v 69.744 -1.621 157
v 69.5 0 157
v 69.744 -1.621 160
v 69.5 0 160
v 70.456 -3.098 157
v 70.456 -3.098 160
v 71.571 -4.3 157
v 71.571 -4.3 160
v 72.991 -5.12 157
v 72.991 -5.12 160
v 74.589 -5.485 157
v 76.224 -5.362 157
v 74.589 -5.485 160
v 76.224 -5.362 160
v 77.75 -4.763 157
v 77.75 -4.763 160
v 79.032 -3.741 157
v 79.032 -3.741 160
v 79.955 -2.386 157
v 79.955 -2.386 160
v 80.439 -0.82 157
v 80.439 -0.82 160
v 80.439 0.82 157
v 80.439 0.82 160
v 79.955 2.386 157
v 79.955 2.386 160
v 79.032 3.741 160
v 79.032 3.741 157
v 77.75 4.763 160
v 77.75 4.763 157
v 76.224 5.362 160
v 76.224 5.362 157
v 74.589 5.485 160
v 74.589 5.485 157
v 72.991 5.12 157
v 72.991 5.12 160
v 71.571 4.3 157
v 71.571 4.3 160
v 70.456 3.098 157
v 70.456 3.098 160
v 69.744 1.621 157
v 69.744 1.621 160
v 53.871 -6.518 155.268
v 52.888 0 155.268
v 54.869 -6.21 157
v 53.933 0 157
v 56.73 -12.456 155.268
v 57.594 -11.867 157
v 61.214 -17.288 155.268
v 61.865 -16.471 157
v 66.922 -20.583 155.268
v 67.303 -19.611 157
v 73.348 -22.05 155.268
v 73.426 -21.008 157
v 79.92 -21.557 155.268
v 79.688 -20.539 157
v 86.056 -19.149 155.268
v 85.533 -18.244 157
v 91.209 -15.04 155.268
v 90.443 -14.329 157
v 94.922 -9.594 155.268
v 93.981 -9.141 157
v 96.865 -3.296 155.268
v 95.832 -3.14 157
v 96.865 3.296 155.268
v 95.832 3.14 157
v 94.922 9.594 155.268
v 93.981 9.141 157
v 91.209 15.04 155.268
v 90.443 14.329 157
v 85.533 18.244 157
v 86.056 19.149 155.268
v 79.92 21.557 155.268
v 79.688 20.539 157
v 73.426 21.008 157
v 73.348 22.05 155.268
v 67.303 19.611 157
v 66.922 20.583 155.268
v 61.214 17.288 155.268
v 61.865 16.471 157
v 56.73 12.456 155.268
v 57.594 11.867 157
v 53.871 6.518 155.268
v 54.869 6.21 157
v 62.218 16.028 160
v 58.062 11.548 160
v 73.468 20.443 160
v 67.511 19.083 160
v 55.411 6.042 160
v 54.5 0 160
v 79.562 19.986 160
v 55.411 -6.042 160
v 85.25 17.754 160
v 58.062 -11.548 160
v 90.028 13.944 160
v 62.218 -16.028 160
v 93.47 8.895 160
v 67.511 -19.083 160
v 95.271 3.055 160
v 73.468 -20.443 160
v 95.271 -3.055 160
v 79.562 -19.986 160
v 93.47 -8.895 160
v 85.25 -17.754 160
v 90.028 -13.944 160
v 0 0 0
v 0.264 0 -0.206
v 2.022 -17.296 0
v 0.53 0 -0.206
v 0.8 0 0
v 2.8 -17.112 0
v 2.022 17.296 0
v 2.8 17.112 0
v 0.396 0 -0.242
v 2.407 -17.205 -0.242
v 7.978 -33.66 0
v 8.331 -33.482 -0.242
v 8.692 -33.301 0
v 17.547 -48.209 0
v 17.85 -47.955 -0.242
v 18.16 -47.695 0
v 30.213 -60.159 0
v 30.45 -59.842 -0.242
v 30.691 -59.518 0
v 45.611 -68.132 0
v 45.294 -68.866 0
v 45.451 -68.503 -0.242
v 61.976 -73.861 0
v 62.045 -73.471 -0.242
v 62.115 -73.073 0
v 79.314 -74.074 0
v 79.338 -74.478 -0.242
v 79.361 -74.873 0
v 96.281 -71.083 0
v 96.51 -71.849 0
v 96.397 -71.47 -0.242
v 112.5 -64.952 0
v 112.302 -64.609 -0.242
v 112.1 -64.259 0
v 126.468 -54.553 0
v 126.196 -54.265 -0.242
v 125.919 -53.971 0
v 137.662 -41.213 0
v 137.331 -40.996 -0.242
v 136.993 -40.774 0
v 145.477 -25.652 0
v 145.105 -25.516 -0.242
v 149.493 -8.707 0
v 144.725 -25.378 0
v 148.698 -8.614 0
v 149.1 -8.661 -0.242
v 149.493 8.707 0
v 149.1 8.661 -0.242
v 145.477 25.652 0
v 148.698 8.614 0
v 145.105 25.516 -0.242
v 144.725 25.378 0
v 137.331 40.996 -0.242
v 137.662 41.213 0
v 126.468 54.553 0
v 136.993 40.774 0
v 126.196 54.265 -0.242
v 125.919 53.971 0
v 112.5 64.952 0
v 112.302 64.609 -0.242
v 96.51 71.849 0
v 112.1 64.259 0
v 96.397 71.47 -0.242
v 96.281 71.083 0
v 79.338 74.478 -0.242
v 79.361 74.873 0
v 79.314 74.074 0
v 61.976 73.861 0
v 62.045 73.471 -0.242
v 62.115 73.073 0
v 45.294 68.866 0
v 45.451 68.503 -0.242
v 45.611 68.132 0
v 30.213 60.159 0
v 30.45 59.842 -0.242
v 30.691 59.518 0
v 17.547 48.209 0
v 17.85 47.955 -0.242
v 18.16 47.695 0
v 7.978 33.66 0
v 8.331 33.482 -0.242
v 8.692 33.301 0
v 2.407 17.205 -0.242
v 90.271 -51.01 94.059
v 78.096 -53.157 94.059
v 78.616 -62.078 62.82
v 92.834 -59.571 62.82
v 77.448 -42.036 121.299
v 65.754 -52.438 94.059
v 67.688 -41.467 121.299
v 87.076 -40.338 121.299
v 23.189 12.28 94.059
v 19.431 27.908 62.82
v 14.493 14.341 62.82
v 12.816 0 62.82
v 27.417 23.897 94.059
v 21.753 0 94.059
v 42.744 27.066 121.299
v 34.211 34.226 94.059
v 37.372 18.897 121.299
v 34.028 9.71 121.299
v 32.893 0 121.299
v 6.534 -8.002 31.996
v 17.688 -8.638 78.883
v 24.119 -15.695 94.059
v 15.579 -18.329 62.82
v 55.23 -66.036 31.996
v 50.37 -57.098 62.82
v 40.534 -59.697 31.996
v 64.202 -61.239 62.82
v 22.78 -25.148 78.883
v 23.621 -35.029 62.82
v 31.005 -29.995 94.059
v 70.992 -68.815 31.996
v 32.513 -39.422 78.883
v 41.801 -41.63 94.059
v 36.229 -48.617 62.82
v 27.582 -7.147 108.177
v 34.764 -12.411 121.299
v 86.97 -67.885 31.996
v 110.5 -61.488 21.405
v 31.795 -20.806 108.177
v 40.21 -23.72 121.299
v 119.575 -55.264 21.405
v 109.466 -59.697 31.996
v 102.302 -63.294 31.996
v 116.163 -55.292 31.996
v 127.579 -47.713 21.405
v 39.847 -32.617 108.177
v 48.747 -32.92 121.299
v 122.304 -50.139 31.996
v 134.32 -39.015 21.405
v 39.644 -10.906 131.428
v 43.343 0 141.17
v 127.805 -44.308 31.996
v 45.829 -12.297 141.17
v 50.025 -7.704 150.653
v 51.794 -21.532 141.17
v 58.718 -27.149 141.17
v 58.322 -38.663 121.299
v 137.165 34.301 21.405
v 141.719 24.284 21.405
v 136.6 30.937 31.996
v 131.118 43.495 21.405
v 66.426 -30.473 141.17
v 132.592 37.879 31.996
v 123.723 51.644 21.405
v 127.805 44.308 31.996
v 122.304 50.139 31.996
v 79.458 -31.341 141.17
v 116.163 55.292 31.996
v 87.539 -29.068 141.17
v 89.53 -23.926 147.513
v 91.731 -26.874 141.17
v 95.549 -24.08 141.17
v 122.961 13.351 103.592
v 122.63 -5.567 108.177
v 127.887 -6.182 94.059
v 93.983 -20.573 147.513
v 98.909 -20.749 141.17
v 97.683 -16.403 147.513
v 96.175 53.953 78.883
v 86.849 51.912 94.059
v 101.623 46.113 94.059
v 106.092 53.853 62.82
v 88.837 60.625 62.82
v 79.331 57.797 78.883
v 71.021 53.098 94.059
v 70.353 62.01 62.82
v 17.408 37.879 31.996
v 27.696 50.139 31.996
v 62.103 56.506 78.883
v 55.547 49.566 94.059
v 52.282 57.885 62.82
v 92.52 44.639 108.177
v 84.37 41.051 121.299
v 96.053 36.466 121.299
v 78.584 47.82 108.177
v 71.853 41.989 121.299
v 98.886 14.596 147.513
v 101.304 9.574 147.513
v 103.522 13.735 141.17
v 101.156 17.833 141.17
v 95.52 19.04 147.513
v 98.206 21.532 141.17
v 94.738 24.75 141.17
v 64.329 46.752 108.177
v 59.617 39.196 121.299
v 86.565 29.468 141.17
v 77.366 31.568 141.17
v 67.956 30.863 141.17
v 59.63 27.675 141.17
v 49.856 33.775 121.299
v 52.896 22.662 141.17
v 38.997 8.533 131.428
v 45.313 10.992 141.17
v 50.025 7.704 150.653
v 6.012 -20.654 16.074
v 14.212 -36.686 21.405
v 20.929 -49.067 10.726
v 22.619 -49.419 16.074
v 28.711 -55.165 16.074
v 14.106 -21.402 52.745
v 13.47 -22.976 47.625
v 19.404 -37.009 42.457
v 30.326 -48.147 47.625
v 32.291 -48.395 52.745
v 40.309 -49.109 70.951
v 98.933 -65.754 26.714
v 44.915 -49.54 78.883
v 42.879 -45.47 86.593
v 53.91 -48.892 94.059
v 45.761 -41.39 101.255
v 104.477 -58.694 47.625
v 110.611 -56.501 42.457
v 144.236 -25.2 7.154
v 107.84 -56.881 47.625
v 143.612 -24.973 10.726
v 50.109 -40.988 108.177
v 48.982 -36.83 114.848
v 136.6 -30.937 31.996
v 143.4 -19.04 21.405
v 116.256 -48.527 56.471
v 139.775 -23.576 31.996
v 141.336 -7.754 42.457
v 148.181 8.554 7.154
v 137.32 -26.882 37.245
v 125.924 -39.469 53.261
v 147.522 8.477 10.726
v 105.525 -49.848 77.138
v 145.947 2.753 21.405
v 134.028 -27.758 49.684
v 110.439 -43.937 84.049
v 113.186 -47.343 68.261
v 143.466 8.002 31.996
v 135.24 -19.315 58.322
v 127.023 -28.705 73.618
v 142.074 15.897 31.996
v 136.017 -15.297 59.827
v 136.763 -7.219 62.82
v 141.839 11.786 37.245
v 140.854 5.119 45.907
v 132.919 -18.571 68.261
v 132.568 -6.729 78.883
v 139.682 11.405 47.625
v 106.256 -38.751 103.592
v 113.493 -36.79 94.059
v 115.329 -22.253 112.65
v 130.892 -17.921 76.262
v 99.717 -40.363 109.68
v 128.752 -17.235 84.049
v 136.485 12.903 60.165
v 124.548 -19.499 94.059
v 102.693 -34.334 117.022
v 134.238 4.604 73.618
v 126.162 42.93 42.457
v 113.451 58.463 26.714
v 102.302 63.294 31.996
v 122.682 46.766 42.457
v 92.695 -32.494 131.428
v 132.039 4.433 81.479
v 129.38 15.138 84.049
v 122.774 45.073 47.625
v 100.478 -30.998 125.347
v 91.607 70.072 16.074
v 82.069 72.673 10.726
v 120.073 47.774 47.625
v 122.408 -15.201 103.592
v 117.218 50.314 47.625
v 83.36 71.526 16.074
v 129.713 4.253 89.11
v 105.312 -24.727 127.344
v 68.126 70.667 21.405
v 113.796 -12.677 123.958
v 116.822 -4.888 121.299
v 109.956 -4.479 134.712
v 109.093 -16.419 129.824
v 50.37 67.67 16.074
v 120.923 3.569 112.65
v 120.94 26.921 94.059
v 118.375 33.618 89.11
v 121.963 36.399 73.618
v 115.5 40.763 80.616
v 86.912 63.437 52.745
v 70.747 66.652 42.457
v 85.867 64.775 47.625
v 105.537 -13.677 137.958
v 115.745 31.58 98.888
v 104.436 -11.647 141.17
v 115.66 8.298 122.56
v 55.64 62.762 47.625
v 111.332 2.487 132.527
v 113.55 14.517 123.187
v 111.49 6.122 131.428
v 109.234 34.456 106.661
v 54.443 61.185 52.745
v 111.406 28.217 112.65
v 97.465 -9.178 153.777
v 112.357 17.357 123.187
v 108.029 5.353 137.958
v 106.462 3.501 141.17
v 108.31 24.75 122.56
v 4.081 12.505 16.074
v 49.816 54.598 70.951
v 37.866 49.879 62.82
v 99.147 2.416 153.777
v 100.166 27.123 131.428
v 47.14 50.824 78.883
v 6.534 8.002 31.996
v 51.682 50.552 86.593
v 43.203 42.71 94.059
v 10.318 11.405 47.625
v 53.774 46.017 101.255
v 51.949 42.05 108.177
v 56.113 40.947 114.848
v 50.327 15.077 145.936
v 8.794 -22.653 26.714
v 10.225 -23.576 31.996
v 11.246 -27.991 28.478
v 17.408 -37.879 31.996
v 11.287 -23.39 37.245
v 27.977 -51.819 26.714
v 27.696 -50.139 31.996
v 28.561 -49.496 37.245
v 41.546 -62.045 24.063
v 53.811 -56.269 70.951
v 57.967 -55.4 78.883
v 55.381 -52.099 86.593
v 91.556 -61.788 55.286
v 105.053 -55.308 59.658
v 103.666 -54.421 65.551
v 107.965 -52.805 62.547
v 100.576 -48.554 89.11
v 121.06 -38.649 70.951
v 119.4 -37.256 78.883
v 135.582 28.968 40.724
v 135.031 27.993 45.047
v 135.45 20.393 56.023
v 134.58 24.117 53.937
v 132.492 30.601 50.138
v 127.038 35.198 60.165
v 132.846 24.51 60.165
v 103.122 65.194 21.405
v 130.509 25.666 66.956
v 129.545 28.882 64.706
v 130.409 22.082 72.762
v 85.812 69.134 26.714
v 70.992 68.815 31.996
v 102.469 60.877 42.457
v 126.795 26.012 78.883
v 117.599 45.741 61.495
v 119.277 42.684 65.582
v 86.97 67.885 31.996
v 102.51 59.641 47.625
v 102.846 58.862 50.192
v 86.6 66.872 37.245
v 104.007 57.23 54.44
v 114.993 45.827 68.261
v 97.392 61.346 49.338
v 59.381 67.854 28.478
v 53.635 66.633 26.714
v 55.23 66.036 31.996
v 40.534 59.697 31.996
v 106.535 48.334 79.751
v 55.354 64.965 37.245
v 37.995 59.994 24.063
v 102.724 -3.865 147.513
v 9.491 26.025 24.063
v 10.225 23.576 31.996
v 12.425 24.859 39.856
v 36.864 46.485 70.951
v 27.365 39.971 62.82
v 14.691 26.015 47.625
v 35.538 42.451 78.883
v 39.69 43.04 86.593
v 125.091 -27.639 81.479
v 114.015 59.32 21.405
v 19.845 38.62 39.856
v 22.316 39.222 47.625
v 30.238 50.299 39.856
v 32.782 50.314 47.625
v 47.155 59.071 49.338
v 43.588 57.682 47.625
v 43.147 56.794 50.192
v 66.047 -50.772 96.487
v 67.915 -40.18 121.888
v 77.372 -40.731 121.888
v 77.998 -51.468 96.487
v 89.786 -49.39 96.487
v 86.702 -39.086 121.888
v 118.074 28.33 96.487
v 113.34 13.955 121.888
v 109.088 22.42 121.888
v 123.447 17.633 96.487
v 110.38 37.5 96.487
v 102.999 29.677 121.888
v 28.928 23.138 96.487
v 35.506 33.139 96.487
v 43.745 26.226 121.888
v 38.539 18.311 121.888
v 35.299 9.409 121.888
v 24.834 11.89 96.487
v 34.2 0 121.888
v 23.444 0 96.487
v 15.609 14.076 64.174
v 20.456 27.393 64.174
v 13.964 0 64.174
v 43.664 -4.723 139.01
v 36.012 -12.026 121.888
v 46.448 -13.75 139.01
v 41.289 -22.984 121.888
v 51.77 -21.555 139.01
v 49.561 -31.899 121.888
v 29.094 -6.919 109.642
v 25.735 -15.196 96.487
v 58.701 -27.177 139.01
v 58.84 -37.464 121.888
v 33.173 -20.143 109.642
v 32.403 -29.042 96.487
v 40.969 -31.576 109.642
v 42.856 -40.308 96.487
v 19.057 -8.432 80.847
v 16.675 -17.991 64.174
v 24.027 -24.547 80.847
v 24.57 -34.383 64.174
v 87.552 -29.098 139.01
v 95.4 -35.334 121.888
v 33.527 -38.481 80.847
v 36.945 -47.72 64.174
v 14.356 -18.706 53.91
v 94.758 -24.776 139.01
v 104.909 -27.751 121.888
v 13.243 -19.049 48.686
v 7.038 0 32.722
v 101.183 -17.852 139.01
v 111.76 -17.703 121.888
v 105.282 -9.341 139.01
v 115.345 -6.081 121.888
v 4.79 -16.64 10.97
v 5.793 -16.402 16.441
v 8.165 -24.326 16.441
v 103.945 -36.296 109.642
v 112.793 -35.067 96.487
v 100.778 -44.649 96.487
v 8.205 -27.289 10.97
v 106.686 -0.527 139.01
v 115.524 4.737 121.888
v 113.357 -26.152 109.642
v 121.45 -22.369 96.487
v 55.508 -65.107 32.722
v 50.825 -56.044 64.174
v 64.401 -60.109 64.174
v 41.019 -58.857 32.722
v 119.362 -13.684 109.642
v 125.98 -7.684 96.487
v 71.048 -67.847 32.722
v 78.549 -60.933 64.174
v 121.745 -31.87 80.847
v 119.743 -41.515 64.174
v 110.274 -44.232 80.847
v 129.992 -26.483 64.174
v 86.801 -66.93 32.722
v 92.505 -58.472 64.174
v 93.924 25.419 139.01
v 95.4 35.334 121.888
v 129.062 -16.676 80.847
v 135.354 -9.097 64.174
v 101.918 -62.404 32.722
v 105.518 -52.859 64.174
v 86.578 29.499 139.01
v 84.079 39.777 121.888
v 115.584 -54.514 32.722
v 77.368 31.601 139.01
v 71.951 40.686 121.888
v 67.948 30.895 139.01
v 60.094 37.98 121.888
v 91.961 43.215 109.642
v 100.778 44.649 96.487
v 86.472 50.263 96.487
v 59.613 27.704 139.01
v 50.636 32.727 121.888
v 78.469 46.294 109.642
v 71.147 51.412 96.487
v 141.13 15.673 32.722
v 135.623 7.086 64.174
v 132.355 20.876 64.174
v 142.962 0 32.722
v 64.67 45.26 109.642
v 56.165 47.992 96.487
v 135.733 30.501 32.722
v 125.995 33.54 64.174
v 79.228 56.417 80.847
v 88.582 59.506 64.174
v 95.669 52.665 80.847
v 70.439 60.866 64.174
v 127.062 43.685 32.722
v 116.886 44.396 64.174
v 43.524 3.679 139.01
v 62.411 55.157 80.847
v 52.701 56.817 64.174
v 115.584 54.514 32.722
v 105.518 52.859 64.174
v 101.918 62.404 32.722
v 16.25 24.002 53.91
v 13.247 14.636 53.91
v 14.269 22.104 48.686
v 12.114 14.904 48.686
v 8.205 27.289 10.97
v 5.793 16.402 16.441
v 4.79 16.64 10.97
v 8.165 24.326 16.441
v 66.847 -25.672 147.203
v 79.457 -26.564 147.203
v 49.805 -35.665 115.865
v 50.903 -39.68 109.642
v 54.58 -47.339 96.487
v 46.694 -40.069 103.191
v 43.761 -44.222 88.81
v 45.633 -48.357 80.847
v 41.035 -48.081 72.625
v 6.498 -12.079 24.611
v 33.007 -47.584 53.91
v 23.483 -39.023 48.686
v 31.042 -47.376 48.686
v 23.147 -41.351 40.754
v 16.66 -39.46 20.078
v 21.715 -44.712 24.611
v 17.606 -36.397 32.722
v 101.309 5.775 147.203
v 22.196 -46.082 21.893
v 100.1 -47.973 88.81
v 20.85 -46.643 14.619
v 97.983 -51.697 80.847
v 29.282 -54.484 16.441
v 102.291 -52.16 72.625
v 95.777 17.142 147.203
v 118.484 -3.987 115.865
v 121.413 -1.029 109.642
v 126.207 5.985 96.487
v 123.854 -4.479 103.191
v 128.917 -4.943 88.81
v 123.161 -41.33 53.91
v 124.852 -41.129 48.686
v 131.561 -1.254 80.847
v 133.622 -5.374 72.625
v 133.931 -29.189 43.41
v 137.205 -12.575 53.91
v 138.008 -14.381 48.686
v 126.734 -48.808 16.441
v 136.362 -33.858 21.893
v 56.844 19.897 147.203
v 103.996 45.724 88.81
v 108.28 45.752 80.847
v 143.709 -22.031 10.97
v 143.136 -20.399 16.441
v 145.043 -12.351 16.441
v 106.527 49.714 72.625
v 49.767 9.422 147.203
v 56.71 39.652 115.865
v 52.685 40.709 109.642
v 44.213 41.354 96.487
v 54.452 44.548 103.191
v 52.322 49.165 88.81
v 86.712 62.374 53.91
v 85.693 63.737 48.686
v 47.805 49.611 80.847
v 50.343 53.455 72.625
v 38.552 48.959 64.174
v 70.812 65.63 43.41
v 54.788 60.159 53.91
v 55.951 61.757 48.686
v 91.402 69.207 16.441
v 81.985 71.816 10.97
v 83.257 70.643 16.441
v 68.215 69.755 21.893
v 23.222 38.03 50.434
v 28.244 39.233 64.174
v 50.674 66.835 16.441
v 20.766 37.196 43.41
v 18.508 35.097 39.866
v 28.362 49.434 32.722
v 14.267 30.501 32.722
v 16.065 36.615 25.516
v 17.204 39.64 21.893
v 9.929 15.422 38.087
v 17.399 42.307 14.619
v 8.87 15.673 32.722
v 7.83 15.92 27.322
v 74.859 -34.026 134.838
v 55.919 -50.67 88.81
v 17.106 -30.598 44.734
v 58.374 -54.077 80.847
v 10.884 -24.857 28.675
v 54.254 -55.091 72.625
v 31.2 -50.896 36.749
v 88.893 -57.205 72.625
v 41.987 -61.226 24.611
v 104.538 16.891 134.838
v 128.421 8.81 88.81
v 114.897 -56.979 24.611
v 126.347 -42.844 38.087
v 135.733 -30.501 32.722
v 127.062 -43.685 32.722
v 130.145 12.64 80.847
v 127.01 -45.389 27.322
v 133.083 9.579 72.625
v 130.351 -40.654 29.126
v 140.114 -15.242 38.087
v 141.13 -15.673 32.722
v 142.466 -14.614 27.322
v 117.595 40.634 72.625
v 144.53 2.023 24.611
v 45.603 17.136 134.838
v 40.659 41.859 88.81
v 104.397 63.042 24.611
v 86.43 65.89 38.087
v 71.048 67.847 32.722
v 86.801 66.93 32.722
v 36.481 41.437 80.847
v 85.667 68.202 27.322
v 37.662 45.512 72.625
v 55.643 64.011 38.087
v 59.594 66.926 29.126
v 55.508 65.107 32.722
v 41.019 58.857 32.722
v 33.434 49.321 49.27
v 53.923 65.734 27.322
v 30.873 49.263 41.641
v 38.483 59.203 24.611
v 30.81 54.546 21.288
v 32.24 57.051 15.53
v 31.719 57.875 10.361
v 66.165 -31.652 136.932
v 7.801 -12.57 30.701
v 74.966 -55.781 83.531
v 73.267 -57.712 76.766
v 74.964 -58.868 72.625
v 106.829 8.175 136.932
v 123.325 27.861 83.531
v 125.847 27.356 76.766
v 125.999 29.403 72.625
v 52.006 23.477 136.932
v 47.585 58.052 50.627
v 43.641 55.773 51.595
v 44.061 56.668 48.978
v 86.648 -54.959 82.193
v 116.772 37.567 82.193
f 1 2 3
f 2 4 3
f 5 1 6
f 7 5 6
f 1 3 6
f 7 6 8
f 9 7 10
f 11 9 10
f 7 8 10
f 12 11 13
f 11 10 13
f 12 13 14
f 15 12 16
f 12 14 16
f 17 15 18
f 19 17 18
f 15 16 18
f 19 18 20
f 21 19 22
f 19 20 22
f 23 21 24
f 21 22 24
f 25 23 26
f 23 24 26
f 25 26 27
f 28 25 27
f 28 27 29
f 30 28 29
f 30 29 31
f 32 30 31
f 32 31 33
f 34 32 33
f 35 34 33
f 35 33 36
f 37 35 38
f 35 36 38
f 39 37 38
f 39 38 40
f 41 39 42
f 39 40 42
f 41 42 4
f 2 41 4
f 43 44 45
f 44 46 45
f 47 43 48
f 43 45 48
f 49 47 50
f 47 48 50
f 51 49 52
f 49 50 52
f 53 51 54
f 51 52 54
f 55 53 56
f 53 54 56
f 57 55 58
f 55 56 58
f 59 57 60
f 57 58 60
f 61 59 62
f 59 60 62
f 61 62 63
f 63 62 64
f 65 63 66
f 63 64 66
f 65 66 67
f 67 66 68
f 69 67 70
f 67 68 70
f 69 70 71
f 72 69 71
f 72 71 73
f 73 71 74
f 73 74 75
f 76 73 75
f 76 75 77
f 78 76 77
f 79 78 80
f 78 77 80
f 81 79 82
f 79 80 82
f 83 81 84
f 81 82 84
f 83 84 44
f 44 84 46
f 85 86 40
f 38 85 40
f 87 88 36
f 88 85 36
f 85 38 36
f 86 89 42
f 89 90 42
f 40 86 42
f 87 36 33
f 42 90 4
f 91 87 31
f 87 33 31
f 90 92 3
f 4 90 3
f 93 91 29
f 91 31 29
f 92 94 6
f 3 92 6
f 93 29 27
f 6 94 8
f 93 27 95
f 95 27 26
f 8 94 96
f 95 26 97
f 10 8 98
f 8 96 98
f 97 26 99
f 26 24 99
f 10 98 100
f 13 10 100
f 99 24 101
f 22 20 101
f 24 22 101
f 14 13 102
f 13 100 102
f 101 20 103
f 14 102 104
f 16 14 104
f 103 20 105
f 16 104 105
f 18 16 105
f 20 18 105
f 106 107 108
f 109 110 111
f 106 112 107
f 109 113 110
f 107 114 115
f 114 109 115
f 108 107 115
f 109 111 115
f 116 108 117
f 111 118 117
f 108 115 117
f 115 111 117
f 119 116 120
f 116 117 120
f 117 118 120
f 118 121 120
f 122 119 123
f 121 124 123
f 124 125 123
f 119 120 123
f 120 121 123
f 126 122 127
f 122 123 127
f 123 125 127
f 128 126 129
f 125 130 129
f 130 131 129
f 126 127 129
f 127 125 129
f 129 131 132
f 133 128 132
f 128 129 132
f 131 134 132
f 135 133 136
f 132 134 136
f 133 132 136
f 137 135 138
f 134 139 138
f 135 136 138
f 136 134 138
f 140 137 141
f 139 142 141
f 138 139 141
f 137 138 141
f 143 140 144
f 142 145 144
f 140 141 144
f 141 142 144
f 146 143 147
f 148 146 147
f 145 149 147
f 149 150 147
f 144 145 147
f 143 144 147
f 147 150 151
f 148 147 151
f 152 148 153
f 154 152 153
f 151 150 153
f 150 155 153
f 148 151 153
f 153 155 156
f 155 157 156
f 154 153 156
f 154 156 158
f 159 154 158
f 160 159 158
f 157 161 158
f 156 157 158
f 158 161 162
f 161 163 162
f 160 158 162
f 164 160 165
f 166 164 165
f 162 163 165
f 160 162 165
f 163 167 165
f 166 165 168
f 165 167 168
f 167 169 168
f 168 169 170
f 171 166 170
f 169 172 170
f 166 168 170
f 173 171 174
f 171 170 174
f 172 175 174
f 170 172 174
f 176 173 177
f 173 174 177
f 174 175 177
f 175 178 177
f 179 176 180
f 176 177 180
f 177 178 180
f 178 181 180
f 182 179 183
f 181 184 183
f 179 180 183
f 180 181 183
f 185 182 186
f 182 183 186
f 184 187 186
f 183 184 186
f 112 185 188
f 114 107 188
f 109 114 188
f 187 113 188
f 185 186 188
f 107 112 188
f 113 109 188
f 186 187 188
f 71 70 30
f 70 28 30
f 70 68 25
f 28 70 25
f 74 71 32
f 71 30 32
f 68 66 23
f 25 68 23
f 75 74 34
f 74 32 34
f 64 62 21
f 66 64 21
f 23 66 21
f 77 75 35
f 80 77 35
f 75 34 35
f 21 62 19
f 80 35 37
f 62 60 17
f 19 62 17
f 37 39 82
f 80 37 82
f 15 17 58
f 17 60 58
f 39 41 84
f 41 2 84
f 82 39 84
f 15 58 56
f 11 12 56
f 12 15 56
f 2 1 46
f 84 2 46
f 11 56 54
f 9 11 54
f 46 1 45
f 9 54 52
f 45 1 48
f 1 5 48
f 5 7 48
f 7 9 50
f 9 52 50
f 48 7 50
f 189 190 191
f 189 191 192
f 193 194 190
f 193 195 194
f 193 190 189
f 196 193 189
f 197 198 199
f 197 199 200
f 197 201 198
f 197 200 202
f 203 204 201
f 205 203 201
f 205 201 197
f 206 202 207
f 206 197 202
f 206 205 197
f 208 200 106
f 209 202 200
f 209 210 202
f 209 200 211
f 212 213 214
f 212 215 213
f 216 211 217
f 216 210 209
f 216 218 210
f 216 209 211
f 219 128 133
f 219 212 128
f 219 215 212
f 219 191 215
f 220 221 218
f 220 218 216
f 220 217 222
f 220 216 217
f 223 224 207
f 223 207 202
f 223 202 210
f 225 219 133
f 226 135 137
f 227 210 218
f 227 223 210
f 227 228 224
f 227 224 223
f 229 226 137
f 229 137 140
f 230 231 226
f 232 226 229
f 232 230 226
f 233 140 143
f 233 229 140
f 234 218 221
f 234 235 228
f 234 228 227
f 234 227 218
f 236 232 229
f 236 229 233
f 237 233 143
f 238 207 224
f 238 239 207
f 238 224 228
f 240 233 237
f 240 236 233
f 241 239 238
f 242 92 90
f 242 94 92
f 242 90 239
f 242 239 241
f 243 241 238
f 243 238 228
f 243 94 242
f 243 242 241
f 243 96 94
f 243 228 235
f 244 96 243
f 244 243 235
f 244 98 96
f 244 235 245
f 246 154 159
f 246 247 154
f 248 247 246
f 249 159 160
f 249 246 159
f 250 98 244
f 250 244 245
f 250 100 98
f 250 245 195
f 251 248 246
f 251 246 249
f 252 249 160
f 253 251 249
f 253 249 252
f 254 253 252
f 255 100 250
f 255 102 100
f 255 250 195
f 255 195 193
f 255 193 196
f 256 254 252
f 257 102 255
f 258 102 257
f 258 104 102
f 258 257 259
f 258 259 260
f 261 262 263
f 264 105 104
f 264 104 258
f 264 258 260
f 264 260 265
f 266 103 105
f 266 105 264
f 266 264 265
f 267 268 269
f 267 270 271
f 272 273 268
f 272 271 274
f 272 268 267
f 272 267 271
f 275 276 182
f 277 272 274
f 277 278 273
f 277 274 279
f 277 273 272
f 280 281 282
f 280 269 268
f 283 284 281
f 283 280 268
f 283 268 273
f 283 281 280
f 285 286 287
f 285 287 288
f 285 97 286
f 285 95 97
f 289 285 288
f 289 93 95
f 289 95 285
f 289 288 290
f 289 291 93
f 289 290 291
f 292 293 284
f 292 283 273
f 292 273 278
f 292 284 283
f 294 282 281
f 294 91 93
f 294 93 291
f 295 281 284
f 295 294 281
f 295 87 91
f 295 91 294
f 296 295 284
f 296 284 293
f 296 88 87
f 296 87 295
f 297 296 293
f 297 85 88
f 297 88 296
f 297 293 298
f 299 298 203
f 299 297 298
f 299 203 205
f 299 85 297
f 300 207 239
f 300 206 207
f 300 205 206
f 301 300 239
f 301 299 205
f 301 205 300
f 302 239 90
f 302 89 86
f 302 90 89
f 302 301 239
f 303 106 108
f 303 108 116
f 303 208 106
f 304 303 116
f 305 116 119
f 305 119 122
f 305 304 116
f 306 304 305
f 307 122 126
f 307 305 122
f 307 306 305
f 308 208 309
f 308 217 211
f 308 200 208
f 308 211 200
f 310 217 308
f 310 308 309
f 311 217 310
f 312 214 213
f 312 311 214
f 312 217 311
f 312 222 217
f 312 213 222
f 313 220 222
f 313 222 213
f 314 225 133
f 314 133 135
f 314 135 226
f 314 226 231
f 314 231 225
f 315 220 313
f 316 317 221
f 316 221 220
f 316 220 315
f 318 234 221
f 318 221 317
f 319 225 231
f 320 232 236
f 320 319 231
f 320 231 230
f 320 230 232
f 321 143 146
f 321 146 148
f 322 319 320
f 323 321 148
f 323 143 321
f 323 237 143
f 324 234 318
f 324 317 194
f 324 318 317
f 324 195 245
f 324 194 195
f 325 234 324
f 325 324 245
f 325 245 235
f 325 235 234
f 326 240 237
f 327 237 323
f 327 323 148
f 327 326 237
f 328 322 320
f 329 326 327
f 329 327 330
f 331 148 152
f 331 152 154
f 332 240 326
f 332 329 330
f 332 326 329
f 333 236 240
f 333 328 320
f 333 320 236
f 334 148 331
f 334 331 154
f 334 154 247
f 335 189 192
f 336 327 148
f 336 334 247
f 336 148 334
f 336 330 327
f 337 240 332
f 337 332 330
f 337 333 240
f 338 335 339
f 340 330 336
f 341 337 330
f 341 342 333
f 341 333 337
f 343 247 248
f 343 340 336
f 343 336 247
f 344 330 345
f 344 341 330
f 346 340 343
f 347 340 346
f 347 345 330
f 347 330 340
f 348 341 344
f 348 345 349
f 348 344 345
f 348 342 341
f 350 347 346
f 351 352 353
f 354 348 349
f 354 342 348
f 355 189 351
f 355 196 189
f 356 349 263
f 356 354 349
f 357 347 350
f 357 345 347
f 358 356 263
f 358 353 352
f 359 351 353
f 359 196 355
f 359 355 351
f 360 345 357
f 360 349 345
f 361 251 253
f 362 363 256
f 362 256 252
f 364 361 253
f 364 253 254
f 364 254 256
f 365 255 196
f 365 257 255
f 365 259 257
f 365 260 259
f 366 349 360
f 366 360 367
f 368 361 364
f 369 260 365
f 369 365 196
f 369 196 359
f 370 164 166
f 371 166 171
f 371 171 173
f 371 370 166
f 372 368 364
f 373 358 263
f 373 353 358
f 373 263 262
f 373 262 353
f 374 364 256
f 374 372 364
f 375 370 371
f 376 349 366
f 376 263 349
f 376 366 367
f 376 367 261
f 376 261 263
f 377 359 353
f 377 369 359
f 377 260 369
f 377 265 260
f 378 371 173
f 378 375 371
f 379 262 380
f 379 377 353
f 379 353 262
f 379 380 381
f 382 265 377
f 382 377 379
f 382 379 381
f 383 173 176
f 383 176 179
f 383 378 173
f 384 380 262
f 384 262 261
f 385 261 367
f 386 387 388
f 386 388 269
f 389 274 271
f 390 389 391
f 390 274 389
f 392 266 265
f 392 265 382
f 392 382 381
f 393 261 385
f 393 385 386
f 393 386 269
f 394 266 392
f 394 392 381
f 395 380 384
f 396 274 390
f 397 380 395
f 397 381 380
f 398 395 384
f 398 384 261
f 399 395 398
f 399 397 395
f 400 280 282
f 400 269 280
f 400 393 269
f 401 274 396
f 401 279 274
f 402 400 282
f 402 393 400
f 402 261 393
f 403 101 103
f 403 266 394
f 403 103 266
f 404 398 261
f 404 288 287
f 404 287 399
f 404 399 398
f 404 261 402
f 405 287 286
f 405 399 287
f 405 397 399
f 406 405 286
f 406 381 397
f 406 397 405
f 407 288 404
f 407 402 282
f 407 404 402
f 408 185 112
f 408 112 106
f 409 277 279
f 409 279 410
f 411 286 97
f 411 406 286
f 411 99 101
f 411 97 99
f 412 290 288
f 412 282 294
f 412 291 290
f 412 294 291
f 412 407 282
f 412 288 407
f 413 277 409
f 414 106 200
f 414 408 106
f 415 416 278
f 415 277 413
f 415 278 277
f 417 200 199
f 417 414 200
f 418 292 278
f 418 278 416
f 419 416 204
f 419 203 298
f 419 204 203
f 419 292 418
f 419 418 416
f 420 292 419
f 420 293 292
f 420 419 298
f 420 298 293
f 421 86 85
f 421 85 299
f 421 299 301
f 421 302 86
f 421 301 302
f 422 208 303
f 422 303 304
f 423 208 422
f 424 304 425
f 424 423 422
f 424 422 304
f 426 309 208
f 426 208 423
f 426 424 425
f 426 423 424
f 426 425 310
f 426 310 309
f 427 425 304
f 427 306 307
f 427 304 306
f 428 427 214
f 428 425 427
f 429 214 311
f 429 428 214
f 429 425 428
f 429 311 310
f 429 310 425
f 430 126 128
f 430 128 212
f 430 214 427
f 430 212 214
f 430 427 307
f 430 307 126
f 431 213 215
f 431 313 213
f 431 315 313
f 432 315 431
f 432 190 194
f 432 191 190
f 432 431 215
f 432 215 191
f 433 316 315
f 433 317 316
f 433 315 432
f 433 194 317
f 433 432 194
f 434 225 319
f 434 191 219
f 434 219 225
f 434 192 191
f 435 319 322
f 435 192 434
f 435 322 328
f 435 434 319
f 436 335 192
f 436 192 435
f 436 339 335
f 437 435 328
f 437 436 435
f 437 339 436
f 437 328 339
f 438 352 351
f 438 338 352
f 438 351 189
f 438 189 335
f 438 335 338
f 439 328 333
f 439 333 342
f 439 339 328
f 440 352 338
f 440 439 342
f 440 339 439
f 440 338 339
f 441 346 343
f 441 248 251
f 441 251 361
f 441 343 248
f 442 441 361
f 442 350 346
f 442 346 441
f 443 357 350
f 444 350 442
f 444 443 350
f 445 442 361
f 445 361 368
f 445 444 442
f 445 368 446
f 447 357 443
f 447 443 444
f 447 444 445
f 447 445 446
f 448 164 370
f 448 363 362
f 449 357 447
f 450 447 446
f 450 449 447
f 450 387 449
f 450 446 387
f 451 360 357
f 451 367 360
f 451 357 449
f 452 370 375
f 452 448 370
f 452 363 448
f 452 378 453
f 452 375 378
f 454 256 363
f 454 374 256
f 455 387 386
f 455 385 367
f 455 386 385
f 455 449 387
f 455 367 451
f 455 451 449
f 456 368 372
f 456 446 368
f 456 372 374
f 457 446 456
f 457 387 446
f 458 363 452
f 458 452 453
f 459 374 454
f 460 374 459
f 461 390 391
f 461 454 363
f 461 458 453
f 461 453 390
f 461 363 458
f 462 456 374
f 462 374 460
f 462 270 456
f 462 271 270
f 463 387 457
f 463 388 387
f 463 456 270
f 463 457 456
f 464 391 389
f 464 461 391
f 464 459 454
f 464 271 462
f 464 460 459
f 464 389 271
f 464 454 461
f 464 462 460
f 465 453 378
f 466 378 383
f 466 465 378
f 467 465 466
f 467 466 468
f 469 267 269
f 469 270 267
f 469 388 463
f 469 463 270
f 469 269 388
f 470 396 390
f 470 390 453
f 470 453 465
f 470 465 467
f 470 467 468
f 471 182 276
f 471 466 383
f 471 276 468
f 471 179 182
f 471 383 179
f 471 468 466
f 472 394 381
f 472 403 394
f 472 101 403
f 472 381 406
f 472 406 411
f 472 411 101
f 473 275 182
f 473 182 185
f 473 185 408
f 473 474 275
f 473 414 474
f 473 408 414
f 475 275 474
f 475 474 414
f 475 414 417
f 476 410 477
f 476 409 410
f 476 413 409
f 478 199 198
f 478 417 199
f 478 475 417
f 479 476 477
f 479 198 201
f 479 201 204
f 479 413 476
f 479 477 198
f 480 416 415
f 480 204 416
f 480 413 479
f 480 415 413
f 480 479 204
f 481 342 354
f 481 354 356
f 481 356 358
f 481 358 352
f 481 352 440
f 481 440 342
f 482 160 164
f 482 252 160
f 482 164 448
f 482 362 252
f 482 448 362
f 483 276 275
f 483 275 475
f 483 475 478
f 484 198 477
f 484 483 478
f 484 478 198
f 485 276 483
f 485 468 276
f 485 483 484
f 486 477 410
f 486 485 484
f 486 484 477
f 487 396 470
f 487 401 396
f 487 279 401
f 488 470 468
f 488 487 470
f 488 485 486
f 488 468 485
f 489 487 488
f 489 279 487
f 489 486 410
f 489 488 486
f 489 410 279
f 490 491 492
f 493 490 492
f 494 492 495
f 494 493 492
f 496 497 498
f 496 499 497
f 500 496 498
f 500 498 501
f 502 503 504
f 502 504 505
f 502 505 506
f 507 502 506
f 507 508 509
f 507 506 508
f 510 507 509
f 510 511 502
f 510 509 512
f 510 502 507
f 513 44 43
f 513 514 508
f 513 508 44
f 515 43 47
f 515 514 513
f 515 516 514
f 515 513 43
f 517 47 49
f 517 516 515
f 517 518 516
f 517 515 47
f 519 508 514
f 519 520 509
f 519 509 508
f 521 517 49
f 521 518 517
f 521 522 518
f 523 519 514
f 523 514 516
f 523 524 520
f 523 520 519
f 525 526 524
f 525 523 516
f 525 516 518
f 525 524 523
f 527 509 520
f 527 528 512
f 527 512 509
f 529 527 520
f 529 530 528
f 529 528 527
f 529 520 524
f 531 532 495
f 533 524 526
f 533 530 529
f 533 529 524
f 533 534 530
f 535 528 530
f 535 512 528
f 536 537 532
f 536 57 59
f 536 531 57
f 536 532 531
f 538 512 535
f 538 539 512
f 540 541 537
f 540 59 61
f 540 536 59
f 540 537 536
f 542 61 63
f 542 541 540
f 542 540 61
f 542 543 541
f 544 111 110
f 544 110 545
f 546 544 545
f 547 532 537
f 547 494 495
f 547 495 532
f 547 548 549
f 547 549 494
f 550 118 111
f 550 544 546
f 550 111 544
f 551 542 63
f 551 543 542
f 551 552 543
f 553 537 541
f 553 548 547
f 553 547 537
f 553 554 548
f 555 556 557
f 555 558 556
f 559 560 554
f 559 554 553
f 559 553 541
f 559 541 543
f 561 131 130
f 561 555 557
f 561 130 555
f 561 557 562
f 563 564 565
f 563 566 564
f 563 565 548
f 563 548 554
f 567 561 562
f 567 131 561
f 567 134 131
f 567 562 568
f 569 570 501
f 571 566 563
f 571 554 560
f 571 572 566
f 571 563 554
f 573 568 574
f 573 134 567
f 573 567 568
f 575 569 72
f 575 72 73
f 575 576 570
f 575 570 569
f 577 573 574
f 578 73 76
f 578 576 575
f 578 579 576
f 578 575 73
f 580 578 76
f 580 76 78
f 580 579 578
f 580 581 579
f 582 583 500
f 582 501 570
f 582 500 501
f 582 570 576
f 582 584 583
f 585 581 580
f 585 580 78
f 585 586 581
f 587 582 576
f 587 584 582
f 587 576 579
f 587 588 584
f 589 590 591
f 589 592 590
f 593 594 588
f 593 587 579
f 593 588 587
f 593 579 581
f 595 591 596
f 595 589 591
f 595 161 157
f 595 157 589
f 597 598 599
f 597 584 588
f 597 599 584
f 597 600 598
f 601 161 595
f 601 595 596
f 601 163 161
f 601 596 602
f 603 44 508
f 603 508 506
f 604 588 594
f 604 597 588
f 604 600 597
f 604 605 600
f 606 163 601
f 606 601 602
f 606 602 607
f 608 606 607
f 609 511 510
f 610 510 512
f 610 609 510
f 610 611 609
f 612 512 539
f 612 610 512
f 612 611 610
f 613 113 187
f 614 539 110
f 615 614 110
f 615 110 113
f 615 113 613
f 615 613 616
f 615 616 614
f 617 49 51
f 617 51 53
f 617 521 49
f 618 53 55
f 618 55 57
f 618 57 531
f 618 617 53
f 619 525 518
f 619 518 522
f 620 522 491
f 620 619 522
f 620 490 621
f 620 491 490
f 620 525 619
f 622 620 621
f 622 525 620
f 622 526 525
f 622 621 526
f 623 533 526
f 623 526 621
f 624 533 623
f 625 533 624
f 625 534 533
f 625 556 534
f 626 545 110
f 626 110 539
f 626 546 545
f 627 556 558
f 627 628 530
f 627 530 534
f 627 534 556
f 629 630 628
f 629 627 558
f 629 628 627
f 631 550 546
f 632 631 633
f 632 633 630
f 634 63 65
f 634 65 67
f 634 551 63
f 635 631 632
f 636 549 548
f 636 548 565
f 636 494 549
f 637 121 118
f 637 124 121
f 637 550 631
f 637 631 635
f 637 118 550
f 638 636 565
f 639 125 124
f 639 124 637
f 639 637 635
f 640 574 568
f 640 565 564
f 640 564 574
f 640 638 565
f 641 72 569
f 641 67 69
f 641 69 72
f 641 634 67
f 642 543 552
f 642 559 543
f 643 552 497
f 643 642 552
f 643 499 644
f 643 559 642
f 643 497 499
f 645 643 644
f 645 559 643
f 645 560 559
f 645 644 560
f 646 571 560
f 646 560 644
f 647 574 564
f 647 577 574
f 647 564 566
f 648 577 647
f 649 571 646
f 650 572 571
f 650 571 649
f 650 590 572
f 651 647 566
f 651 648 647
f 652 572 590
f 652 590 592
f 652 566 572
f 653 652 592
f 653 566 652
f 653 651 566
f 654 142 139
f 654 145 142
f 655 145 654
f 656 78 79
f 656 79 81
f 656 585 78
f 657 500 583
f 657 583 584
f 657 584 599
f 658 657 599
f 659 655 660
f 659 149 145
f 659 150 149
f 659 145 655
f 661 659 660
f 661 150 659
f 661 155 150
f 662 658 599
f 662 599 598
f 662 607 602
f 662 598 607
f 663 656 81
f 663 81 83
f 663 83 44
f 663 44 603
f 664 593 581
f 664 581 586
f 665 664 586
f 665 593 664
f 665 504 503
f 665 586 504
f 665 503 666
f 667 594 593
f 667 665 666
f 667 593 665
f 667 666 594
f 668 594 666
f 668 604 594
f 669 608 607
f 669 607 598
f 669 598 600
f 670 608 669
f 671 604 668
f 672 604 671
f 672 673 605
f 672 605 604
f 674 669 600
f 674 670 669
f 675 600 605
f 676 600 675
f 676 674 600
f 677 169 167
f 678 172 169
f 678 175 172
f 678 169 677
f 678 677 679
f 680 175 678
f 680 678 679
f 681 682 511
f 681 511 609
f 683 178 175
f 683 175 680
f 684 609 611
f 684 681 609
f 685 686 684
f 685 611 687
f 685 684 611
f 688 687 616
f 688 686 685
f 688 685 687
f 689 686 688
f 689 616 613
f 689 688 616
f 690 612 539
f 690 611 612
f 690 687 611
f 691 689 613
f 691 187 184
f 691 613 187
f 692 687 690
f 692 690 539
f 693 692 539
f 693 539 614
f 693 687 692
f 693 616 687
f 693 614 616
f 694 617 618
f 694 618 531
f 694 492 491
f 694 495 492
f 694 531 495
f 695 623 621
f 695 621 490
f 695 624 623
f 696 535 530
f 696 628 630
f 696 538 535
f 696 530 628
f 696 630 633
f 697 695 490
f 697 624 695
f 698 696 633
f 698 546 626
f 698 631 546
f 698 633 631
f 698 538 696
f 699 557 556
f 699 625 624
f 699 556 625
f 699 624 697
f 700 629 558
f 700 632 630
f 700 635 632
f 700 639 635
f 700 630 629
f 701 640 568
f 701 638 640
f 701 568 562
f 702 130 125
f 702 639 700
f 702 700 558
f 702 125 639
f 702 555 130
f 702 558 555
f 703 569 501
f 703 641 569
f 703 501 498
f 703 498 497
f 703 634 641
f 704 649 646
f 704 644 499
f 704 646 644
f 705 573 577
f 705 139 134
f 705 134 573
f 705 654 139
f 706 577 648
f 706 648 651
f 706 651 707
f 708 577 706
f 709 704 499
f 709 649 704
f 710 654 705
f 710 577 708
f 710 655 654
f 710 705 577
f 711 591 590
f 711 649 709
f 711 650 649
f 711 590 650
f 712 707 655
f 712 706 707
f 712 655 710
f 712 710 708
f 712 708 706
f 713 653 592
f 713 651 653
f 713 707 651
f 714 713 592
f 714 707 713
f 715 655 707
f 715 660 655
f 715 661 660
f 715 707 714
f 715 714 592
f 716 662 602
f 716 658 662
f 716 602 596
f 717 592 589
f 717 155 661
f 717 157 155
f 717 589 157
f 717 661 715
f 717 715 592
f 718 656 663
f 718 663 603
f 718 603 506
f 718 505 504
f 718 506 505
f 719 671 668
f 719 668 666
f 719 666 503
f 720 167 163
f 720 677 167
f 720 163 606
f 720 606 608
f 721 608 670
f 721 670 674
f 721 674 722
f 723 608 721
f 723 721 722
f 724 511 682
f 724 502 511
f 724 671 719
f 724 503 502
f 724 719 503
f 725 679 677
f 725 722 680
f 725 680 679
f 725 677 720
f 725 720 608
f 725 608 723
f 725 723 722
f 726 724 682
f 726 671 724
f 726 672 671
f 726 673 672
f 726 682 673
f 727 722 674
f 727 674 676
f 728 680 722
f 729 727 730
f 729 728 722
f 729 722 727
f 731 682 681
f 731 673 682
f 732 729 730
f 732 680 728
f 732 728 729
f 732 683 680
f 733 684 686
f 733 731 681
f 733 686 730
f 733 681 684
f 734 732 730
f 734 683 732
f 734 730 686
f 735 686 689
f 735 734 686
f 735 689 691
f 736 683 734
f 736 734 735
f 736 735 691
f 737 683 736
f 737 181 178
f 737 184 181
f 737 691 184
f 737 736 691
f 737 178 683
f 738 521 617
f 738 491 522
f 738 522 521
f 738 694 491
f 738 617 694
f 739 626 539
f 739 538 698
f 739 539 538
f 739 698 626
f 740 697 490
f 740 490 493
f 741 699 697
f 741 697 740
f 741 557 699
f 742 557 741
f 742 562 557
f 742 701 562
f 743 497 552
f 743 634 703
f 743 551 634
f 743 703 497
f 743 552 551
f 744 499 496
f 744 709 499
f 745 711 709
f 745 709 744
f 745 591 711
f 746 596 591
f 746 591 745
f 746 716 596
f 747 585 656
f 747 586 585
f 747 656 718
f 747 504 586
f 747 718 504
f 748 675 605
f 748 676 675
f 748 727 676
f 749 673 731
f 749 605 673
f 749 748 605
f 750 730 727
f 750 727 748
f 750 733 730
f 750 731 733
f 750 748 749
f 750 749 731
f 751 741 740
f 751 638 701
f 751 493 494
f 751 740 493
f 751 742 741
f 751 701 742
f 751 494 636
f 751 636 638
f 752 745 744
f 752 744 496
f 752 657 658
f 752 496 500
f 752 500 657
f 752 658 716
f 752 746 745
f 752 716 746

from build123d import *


with BuildPart() as f1:
    # F0 (on Front) → F1 (revolve)
    with BuildSketch(Plane.XZ):
        with BuildLine():
            add(Edge.make_bspline(
                [(0, 0), (6.5291868842, 35.4668631952), (18.6472793011, 99.7414014489), (43.1501770059, 141.3564868386), (54.5, 160)],
                knots=[0, 0, 0, 0, 0.5506466768, 1, 1, 1, 1], degree=3))
            add(Edge.make_bspline(
                [(0, 0), (0.1308692748, -0.1206062597), (0.3939623113, -0.3630670446), (0.6641903637, -0.121437011), (0.8, 0)],
                knots=[0, 0, 0, 0, 0.4974258406, 1, 1, 1, 1], degree=3))
            add(Edge.make_bspline(
                [(52.8883244039, 155.2684753143), (42.5876573247, 138.1825267382), (19.0049986854, 97.9138826849), (7.4036254141, 35.5169816417), (0.8, 0)],
                knots=[0.028447332, 0.028447332, 0.028447332, 0.028447332, 0.4469818582, 1, 1, 1, 1], degree=3))
            add(Edge.make_bspline(
                [(53.9330697915, 157), (53.5847132821, 156.4230246568), (53.2364380328, 155.8458992341), (52.8883244039, 155.2684753143)],
                knots=[0.0143028527, 0.0143028527, 0.0143028527, 0.0143028527, 0.028447332, 0.028447332, 0.028447332, 0.028447332], degree=3))
            Line((53.9330697915, 157), (69.5, 157))
            Line((69.5, 157), (69.5, 160))
            Line((69.5, 160), (54.5, 160))
        make_face()
        with BuildLine():
            add(Edge.make_bspline(
                [(53.9330697915, 157), (53.5847132821, 156.4230246568), (53.2364380328, 155.8458992341), (52.8883244039, 155.2684753143)],
                knots=[0.0143028527, 0.0143028527, 0.0143028527, 0.0143028527, 0.028447332, 0.028447332, 0.028447332, 0.028447332], degree=3))
            Line((52.8883244039, 155.2684753143), (53.9330697915, 157))
        make_face()
    revolve(axis=Axis((75, 0, 80), (0, 0, 1)))


solid = f1.part
